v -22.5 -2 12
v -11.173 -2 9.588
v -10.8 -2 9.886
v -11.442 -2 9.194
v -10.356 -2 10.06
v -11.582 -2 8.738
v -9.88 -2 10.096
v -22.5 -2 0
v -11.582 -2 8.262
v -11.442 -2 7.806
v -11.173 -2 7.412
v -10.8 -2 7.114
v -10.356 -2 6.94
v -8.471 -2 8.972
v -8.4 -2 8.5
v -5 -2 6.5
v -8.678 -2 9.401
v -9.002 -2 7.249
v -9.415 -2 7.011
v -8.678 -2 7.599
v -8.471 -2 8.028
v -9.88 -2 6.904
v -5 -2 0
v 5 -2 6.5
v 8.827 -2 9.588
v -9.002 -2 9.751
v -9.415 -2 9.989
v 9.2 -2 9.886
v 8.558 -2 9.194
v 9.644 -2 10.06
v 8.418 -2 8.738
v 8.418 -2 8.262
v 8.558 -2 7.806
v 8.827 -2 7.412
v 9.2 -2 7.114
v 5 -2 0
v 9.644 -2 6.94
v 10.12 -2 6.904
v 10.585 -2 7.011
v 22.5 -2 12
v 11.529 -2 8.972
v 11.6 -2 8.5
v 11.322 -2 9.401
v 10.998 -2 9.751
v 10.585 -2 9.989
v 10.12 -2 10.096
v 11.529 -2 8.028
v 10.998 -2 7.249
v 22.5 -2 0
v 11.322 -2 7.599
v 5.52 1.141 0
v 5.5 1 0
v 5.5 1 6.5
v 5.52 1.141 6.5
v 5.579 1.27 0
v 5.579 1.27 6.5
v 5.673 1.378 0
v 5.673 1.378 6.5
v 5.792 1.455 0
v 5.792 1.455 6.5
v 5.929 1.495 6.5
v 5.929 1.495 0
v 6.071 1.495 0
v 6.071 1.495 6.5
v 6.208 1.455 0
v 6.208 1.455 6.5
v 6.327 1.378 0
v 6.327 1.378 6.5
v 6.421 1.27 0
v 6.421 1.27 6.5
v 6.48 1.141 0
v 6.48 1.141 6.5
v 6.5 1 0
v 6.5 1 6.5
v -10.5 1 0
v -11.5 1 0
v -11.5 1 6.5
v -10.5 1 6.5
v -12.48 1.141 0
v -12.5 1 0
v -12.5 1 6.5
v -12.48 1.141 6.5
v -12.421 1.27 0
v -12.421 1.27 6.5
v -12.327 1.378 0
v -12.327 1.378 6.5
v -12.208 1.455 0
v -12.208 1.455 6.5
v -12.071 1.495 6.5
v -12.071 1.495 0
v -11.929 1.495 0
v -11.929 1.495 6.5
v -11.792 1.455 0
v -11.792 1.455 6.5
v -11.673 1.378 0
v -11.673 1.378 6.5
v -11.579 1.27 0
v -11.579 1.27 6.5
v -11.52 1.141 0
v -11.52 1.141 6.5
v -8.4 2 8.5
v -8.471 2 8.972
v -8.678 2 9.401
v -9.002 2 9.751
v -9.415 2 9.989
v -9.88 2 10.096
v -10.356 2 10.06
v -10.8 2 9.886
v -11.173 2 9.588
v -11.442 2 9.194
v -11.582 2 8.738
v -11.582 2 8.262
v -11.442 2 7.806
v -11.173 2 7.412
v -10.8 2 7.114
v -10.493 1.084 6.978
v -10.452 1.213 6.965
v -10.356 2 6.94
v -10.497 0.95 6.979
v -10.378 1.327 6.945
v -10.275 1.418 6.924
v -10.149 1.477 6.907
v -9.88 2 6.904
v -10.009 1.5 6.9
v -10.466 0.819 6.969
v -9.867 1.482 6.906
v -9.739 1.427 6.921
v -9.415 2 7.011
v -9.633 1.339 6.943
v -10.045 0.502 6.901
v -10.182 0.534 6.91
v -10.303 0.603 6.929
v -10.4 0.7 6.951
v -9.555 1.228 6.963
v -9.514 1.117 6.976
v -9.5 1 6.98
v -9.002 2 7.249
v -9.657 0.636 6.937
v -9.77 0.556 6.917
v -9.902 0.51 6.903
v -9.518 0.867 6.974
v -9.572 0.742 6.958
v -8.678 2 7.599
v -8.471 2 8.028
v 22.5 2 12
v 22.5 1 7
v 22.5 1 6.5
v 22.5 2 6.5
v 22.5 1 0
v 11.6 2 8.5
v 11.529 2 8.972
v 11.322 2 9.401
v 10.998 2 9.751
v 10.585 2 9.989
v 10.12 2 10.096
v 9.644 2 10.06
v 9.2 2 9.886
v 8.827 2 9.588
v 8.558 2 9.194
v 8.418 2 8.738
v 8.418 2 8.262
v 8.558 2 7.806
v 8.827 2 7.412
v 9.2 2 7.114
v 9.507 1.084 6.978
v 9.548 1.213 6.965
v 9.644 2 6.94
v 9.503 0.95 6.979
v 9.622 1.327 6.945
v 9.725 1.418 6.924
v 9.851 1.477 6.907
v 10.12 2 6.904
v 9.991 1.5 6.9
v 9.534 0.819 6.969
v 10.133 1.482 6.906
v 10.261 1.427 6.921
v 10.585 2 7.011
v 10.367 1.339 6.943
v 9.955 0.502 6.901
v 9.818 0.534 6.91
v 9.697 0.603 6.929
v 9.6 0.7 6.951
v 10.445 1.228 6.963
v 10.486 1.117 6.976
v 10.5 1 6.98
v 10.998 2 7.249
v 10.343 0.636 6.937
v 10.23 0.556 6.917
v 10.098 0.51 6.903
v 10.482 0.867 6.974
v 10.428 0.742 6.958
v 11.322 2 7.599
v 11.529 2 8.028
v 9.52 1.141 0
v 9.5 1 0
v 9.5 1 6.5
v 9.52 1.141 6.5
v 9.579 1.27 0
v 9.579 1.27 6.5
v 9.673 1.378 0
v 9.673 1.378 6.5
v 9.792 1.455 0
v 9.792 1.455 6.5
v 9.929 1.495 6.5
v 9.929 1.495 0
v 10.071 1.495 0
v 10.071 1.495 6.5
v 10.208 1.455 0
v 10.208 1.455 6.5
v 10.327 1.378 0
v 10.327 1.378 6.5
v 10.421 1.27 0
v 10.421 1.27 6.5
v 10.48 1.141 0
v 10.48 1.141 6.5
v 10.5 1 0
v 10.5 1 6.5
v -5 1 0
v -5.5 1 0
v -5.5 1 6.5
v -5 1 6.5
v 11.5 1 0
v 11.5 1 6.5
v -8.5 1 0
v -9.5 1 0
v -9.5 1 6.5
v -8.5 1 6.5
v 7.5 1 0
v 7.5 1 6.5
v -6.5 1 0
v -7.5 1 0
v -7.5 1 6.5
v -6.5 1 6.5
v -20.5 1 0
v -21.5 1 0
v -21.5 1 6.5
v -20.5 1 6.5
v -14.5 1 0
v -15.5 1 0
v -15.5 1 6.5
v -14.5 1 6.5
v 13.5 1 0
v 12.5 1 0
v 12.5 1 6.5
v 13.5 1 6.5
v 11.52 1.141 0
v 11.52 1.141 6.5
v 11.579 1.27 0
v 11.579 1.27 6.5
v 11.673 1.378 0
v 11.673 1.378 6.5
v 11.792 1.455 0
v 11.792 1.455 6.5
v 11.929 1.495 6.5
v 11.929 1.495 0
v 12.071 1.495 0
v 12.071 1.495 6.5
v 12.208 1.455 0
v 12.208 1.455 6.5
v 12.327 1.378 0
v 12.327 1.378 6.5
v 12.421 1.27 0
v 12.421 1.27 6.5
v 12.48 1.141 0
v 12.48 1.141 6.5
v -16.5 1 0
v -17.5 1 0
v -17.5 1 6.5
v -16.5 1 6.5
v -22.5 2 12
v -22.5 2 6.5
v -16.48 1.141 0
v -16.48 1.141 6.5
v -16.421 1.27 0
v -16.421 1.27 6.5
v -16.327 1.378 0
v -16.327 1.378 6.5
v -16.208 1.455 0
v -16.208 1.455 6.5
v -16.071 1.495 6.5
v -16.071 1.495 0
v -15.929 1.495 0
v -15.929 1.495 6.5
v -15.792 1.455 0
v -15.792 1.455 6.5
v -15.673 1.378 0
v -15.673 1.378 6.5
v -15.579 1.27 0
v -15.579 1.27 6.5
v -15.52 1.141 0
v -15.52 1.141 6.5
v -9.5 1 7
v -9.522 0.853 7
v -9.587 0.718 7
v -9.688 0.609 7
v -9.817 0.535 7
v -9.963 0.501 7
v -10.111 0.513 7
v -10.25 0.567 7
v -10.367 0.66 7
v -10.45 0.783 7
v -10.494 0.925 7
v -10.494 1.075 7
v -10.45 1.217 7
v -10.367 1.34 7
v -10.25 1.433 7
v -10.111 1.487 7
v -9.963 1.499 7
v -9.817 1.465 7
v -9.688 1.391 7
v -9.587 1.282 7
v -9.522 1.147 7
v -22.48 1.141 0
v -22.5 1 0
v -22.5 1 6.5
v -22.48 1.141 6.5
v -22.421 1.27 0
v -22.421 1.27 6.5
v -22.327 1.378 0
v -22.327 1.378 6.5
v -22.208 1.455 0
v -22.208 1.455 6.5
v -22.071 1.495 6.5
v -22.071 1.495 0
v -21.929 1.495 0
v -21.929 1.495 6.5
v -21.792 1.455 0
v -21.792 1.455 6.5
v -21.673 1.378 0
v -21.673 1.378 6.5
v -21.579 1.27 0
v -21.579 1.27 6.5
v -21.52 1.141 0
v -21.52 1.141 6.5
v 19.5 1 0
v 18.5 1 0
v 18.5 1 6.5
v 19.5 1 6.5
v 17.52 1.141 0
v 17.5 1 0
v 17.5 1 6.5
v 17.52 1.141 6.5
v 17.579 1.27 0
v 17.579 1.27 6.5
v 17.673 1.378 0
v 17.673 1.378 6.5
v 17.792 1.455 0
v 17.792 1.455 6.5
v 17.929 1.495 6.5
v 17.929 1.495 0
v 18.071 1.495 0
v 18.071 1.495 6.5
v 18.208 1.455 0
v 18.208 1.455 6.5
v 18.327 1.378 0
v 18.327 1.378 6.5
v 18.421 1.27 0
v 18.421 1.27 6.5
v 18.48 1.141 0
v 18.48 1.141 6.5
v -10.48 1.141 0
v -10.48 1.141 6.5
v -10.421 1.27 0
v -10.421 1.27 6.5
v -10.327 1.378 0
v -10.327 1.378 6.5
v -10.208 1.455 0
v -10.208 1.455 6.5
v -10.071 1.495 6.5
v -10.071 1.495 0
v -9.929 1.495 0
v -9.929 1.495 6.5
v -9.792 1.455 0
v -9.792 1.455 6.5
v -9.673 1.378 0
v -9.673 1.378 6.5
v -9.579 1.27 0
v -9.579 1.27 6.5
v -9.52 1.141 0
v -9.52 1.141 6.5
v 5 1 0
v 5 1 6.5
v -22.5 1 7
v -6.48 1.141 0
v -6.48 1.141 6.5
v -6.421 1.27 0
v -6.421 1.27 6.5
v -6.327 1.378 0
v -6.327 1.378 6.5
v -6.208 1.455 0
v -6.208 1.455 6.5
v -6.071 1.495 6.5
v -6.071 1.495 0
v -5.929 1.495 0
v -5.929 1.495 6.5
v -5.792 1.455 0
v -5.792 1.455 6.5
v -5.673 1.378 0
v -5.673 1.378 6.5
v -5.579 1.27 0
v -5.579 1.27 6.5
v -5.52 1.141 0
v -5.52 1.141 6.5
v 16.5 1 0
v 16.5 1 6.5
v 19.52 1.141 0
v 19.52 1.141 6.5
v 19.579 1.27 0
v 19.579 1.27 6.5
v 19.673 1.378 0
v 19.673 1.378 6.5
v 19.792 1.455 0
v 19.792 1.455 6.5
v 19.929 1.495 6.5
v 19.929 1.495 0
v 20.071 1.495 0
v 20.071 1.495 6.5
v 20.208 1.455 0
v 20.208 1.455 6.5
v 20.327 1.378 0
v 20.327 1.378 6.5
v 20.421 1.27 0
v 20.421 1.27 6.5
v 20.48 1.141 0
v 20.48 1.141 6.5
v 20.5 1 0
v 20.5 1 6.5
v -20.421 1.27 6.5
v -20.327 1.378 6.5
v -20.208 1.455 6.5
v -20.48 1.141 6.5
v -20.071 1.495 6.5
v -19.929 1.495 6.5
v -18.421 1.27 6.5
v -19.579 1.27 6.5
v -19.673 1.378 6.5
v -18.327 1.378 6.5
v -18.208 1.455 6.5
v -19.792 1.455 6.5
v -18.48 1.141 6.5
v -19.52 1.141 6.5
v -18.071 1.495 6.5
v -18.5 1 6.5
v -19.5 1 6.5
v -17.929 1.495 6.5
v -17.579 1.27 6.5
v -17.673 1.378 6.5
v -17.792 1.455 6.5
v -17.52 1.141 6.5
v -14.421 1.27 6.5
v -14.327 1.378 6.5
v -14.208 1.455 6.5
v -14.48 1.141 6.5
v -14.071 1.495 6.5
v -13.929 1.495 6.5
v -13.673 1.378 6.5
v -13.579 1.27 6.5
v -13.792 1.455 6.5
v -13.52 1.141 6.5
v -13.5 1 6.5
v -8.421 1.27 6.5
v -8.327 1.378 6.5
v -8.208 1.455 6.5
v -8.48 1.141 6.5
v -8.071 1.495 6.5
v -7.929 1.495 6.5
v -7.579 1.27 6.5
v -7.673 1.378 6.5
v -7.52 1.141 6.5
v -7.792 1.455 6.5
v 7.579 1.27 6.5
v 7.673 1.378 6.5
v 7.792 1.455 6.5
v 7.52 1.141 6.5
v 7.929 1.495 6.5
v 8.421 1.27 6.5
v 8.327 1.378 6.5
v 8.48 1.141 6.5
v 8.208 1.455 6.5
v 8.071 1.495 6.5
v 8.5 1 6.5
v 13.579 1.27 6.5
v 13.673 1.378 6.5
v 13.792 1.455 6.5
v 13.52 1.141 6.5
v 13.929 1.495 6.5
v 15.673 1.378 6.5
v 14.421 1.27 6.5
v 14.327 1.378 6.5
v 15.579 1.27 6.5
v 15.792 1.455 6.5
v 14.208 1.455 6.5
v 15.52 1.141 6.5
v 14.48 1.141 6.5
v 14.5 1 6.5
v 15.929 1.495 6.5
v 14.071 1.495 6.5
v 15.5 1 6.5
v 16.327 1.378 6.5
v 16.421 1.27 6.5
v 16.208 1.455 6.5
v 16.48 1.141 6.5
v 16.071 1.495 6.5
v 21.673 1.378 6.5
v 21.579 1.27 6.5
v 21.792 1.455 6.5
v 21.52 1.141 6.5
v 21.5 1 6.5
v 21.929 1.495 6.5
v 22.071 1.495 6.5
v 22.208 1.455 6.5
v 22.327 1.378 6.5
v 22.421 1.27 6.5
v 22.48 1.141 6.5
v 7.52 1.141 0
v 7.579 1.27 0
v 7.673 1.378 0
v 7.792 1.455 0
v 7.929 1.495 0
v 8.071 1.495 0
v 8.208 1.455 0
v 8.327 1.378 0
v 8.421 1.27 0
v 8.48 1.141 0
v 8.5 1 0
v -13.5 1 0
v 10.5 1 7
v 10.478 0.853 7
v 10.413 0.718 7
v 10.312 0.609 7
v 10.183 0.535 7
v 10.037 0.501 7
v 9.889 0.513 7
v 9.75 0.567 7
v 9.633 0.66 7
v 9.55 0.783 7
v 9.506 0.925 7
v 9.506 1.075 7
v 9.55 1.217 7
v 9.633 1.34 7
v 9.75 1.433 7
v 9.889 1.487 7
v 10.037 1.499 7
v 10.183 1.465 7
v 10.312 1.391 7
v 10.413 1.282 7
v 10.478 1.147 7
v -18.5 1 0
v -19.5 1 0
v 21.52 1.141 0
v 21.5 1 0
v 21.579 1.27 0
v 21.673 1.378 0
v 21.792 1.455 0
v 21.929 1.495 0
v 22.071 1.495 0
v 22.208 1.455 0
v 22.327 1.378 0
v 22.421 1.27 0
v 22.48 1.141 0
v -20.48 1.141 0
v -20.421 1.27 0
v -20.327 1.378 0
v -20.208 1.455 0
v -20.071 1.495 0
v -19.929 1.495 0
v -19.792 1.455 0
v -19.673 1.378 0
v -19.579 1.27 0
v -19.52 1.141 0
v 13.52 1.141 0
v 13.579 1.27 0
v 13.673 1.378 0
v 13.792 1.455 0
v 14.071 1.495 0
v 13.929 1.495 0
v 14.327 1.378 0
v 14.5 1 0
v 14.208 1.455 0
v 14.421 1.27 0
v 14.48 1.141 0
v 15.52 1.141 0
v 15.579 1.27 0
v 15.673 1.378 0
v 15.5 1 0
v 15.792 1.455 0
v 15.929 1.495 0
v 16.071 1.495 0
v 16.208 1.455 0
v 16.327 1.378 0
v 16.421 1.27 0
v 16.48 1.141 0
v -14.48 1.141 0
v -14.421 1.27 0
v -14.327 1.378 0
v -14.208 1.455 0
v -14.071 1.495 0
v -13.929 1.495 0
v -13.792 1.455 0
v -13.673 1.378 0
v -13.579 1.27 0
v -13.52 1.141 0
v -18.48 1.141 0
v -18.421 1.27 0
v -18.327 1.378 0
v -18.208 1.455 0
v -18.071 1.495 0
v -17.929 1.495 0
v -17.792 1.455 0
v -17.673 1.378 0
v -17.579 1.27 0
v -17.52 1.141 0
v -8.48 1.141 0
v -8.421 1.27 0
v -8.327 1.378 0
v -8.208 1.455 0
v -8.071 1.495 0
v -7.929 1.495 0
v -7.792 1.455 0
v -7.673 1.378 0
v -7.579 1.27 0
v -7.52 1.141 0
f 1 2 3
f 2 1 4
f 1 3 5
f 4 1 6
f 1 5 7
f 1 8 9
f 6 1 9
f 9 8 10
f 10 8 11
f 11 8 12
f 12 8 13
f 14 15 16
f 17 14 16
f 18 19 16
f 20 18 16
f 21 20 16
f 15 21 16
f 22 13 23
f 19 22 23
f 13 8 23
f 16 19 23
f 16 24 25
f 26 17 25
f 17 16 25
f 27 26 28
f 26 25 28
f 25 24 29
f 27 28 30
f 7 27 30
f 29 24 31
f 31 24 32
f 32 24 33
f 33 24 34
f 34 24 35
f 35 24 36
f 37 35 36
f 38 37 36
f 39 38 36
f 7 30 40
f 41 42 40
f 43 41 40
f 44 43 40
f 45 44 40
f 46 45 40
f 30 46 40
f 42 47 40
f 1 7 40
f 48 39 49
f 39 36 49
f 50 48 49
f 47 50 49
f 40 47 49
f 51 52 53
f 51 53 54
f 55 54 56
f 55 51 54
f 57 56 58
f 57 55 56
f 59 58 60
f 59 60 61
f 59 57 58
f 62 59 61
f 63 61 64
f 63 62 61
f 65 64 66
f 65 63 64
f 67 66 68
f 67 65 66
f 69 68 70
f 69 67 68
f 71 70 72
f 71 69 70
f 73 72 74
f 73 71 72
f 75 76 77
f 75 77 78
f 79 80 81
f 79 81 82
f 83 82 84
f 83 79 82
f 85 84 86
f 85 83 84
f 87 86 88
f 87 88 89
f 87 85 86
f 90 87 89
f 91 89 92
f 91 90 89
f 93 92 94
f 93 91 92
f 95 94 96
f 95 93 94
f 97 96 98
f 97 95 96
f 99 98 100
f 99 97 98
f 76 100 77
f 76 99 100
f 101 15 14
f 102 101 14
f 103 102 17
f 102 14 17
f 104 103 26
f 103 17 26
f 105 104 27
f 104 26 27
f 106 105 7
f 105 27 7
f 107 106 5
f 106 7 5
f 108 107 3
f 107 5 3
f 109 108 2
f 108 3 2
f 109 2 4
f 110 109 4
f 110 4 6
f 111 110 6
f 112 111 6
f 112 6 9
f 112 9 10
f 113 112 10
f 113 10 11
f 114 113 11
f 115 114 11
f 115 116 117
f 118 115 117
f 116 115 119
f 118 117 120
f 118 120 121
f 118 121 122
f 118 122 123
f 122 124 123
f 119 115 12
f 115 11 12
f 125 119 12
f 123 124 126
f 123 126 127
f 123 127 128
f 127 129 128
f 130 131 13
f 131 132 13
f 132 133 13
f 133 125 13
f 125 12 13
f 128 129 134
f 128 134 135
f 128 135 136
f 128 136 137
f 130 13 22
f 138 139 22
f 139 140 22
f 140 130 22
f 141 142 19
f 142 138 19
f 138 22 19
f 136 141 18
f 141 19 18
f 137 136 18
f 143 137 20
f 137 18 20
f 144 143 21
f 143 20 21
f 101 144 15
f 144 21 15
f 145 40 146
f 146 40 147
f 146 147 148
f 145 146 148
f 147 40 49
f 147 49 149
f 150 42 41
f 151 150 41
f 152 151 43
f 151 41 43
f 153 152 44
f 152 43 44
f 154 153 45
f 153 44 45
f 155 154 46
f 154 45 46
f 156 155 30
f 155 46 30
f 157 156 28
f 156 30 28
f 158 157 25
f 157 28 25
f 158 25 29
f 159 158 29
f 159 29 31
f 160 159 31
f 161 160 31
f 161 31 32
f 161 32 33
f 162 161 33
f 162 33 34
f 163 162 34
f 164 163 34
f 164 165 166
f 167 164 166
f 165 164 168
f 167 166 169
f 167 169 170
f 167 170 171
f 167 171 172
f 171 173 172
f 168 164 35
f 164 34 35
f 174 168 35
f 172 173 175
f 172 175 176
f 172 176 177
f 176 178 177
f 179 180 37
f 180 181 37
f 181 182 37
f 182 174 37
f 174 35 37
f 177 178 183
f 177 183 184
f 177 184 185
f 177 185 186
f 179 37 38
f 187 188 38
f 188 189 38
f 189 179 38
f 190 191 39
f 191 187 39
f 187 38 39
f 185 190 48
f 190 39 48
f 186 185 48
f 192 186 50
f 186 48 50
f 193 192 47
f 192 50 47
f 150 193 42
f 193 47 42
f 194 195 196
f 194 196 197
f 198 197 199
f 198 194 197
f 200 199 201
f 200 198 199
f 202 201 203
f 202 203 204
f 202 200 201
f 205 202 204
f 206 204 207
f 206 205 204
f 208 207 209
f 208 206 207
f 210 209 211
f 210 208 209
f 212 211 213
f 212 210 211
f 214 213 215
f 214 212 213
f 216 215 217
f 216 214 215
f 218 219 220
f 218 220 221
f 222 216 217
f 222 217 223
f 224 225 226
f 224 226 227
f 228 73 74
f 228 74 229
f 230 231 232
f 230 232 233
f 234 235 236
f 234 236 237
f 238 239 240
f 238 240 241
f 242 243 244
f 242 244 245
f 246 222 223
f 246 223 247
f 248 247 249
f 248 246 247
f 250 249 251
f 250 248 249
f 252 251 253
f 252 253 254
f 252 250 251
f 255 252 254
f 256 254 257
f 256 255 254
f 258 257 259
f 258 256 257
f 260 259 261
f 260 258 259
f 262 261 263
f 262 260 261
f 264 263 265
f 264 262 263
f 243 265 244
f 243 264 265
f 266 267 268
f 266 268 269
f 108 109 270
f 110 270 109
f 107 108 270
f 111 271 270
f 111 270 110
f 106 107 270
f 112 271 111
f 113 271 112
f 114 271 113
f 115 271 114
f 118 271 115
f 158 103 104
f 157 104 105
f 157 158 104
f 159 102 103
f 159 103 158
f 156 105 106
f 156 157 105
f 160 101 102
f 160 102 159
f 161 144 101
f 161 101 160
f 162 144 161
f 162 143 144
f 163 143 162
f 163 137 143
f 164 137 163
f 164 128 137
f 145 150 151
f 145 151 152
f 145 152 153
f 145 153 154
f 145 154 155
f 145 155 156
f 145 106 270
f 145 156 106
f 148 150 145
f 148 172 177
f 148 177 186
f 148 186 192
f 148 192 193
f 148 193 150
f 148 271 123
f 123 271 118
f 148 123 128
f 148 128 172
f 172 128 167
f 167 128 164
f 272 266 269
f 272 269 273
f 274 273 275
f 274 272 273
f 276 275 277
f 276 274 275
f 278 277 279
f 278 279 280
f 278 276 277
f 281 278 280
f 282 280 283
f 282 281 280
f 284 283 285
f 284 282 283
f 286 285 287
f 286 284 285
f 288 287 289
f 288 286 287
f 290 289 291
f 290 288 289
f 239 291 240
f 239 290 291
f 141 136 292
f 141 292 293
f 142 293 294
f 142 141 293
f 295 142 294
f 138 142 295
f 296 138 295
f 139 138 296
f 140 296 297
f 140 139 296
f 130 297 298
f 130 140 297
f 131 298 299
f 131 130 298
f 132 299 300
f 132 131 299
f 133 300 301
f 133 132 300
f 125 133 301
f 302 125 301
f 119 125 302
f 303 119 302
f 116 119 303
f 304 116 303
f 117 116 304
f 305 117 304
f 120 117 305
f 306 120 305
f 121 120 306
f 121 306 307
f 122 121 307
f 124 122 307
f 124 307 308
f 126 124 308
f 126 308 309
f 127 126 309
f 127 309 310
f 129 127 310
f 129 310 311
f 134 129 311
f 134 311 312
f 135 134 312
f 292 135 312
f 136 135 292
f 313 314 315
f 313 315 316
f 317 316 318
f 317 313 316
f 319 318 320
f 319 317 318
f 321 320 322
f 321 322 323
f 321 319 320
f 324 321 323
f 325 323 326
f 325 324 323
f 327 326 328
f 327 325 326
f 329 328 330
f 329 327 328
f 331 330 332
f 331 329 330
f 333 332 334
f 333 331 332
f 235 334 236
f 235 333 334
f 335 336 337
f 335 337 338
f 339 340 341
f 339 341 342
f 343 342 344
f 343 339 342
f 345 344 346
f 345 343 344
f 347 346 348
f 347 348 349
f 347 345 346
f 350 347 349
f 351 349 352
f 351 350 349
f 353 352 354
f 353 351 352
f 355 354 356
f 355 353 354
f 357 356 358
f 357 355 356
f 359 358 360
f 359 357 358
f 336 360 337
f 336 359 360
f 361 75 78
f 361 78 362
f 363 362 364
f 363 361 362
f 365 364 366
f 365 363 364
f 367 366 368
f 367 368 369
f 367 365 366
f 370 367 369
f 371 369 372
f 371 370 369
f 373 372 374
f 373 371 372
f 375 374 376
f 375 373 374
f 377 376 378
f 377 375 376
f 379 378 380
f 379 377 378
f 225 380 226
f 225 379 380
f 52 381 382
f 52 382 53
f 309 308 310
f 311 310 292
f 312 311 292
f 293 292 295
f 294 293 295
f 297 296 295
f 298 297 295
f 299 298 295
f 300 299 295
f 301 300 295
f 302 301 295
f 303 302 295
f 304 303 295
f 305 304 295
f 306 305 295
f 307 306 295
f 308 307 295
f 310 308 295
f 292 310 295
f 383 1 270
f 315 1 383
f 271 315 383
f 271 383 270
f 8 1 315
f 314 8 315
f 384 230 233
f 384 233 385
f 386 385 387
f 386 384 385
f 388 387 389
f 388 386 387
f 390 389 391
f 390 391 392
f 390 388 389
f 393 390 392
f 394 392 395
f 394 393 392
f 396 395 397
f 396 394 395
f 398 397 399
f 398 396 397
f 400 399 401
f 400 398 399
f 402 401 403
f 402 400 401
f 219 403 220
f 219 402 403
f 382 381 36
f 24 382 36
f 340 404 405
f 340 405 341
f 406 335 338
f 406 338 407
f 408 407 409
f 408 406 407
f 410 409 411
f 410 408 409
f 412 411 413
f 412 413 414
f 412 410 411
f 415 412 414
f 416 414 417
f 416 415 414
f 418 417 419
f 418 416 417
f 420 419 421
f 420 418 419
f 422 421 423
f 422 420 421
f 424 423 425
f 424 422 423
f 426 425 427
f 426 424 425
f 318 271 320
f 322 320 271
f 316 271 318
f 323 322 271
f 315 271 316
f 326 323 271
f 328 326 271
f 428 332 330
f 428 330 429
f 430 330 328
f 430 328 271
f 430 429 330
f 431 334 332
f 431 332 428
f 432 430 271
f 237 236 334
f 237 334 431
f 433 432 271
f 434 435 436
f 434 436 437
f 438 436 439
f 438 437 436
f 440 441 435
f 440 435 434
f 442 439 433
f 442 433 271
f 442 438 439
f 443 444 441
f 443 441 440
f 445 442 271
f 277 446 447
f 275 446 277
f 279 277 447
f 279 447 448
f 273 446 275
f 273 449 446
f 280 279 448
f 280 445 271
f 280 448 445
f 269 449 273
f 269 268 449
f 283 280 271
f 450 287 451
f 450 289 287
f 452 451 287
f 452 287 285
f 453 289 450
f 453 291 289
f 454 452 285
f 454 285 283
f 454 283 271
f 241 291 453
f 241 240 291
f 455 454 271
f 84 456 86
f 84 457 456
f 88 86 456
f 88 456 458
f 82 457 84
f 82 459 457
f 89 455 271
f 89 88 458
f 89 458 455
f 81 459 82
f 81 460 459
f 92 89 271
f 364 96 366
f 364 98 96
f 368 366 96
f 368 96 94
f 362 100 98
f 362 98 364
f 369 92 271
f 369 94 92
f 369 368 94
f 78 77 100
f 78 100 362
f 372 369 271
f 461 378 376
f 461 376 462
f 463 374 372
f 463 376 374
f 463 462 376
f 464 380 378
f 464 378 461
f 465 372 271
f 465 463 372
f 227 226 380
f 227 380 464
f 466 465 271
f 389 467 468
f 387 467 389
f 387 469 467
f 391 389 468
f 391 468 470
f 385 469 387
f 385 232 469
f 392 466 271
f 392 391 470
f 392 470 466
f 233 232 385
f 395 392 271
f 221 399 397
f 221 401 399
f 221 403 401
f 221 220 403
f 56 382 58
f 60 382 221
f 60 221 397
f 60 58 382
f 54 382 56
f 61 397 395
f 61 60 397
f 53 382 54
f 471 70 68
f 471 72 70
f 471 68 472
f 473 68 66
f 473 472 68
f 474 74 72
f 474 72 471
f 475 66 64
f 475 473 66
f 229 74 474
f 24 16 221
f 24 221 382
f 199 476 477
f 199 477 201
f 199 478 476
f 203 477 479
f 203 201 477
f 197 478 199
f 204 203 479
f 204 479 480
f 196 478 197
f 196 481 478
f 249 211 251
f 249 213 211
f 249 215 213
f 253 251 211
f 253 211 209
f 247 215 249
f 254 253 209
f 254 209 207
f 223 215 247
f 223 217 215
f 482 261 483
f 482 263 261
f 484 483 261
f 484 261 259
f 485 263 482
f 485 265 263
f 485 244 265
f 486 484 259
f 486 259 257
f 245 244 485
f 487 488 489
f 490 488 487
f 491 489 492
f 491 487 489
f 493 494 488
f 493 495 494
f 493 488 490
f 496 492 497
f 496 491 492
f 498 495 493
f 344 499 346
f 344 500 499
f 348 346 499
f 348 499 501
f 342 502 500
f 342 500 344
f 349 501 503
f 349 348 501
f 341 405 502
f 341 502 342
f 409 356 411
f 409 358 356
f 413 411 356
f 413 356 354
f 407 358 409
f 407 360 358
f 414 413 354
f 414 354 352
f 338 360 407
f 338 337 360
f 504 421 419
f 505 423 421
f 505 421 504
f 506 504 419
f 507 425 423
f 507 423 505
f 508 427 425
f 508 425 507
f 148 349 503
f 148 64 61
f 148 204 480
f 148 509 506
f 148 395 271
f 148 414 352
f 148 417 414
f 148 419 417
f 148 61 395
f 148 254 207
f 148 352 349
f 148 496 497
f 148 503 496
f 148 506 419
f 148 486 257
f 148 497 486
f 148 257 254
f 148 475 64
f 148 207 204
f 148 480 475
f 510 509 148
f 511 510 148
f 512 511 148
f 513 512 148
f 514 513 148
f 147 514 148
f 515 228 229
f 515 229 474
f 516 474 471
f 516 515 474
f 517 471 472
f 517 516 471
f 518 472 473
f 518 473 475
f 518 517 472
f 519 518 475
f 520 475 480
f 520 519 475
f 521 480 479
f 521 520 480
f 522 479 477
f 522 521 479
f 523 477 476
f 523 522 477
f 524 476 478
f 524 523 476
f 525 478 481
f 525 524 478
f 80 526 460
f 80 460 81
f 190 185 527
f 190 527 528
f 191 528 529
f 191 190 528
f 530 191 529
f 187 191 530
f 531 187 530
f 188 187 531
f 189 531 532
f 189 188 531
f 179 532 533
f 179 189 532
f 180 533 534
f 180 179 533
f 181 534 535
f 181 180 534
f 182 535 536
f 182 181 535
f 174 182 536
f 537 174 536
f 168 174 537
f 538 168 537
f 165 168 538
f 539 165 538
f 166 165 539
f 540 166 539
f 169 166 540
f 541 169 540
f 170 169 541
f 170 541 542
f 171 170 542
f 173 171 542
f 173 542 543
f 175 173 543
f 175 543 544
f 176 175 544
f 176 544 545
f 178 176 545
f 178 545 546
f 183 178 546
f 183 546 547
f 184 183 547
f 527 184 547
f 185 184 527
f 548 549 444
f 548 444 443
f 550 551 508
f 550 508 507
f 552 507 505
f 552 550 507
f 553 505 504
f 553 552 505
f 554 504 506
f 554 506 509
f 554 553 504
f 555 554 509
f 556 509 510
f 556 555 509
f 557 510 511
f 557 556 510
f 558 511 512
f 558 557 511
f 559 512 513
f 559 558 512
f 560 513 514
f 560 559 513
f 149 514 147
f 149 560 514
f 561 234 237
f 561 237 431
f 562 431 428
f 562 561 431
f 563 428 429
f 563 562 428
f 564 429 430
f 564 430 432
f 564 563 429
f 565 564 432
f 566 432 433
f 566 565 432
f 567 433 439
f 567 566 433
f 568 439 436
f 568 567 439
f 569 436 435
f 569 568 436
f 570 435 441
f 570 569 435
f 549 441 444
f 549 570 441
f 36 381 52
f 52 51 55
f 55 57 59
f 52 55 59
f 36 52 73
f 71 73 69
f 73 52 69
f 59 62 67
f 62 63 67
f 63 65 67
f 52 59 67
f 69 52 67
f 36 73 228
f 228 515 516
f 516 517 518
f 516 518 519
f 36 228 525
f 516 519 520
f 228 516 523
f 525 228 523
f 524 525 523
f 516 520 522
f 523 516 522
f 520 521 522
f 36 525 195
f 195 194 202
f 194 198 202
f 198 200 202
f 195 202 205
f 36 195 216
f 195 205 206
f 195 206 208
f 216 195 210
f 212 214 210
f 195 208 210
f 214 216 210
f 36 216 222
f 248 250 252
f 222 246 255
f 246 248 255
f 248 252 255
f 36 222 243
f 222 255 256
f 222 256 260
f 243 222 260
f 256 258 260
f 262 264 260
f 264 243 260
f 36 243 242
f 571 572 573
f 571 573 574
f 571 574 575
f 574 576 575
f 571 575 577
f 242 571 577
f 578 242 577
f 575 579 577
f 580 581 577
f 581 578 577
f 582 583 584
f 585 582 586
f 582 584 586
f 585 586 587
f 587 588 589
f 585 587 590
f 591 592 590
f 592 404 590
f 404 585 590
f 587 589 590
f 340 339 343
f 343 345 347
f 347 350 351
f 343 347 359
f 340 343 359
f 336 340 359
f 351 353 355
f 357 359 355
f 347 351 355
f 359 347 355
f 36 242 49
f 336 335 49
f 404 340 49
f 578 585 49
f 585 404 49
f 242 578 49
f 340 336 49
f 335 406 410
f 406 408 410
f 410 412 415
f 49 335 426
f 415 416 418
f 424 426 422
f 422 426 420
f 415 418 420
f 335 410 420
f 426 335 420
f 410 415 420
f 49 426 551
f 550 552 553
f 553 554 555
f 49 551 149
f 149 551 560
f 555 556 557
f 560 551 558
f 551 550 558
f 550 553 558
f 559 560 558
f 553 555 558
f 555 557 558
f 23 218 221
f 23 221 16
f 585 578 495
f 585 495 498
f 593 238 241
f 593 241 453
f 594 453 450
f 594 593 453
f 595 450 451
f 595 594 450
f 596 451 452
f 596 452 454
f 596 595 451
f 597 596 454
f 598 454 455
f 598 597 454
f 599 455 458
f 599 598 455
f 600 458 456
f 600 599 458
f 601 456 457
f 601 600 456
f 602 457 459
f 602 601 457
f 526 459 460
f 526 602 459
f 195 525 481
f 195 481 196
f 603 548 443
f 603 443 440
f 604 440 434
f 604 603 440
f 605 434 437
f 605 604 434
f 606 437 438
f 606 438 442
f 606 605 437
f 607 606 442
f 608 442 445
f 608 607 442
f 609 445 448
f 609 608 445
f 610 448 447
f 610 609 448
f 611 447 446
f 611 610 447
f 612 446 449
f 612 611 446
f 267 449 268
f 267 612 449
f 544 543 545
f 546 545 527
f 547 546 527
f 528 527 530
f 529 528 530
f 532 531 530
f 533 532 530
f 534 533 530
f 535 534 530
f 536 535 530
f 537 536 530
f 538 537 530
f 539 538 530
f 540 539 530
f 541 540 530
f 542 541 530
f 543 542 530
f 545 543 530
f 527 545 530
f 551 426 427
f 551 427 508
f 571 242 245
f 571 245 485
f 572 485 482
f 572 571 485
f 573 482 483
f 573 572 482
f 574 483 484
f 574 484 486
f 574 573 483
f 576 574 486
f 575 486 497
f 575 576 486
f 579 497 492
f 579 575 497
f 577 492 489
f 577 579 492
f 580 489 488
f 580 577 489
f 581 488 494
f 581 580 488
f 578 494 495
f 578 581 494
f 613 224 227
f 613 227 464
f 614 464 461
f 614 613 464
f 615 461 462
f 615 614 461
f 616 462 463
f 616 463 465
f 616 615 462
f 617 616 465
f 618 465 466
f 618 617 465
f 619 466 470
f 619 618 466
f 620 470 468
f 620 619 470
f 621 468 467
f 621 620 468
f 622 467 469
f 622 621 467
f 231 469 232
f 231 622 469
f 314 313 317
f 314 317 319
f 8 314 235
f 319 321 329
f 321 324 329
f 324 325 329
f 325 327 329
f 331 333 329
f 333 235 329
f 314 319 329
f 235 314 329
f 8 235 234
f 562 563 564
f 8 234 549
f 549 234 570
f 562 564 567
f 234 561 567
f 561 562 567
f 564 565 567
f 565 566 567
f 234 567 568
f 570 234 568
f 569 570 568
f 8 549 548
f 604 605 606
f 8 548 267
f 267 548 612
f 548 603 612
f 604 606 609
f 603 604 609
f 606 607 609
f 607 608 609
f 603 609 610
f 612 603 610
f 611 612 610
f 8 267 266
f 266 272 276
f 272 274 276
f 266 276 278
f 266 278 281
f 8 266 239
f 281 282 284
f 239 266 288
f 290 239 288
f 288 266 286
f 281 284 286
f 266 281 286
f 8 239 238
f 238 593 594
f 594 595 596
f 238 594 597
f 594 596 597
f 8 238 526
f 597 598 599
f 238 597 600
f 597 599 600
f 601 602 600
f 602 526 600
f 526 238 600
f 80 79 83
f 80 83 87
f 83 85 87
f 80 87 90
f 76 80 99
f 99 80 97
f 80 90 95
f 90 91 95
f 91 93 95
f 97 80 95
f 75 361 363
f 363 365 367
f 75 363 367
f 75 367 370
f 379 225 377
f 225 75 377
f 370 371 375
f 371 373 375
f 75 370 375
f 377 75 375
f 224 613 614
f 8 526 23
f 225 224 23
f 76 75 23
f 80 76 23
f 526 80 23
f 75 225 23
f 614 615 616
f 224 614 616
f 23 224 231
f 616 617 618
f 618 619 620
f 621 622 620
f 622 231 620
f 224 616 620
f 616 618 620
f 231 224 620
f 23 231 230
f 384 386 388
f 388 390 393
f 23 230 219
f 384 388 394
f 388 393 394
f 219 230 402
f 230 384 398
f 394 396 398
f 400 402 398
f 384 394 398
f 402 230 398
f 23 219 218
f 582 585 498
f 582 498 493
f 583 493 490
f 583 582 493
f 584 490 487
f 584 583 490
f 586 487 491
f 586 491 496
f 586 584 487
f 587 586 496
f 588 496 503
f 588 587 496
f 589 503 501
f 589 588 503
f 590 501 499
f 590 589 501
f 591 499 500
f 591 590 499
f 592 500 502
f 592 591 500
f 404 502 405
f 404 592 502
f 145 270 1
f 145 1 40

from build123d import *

# Parameters (mm, degrees)
F0_W     = 45
F0_H     = 4
F1_DEPTH = 12
F2_R     = 1.6
F3_DEPTH = 4.001
F4_W     = 45
F4_H     = 1
F5_DEPTH = 6.5
F6_R     = 0.5
F7_DEPTH = 7
F8_W     = 10
F8_H     = 9.745784
F9_DEPTH = 6.5


with BuildPart() as f1:
    # F0 (on Top) → F1 (new body)
    with BuildSketch(Plane.XY):
        Rectangle(F0_W, F0_H)
    extrude(amount=F1_DEPTH)

    # F2 (on face) → F3 (cut, through all)
    with BuildSketch(Plane.XZ.offset(2)):
        with Locations((-10, 8.5)):
            Circle(F2_R)
        with Locations((10, 8.5)):
            Circle(F2_R)
    extrude(amount=-F3_DEPTH, mode=Mode.SUBTRACT)

    # F4 (on face) → F5 (cut)
    with BuildSketch(Plane(origin=(0, 0, 0), x_dir=(1, 0, 0), z_dir=(0, 0, -1))):
        with Locations((0, -1.5)):
            Rectangle(F4_W, F4_H)
    extrude(amount=-F5_DEPTH, mode=Mode.SUBTRACT)

    # F6 (on face) → F7 (join)
    with BuildSketch(Plane(origin=(0, 0, 0), x_dir=(1, 0, 0), z_dir=(0, 0, -1))):
        with Locations((22, -1)):
            Circle(F6_R)
        with Locations((20, -1)):
            Circle(F6_R)
        with Locations((18, -1)):
            Circle(F6_R)
        with Locations((16, -1)):
            Circle(F6_R)
        with Locations((14, -1)):
            Circle(F6_R)
        with Locations((12, -1)):
            Circle(F6_R)
        with Locations((10, -1)):
            Circle(F6_R)
        with Locations((8, -1)):
            Circle(F6_R)
        with Locations((6, -1)):
            Circle(F6_R)
        with Locations((4, -1)):
            Circle(F6_R)
        with Locations((2, -1)):
            Circle(F6_R)
        with Locations((0, -1)):
            Circle(F6_R)
        with Locations((-2, -1)):
            Circle(F6_R)
        with Locations((-4, -1)):
            Circle(F6_R)
        with Locations((-6, -1)):
            Circle(F6_R)
        with Locations((-8, -1)):
            Circle(F6_R)
        with Locations((-10, -1)):
            Circle(F6_R)
        with Locations((-12, -1)):
            Circle(F6_R)
        with Locations((-14, -1)):
            Circle(F6_R)
        with Locations((-16, -1)):
            Circle(F6_R)
        with Locations((-18, -1)):
            Circle(F6_R)
        with Locations((-20, -1)):
            Circle(F6_R)
        with Locations((-22, -1)):
            Circle(F6_R)
    extrude(amount=-F7_DEPTH)

    # F8 (on face) → F9 (cut)
    with BuildSketch(Plane(origin=(0, 0, 0), x_dir=(1, 0, 0), z_dir=(0, 0, -1))):
        Rectangle(F8_W, F8_H)
    extrude(amount=-F9_DEPTH, mode=Mode.SUBTRACT)


solid = f1.part
